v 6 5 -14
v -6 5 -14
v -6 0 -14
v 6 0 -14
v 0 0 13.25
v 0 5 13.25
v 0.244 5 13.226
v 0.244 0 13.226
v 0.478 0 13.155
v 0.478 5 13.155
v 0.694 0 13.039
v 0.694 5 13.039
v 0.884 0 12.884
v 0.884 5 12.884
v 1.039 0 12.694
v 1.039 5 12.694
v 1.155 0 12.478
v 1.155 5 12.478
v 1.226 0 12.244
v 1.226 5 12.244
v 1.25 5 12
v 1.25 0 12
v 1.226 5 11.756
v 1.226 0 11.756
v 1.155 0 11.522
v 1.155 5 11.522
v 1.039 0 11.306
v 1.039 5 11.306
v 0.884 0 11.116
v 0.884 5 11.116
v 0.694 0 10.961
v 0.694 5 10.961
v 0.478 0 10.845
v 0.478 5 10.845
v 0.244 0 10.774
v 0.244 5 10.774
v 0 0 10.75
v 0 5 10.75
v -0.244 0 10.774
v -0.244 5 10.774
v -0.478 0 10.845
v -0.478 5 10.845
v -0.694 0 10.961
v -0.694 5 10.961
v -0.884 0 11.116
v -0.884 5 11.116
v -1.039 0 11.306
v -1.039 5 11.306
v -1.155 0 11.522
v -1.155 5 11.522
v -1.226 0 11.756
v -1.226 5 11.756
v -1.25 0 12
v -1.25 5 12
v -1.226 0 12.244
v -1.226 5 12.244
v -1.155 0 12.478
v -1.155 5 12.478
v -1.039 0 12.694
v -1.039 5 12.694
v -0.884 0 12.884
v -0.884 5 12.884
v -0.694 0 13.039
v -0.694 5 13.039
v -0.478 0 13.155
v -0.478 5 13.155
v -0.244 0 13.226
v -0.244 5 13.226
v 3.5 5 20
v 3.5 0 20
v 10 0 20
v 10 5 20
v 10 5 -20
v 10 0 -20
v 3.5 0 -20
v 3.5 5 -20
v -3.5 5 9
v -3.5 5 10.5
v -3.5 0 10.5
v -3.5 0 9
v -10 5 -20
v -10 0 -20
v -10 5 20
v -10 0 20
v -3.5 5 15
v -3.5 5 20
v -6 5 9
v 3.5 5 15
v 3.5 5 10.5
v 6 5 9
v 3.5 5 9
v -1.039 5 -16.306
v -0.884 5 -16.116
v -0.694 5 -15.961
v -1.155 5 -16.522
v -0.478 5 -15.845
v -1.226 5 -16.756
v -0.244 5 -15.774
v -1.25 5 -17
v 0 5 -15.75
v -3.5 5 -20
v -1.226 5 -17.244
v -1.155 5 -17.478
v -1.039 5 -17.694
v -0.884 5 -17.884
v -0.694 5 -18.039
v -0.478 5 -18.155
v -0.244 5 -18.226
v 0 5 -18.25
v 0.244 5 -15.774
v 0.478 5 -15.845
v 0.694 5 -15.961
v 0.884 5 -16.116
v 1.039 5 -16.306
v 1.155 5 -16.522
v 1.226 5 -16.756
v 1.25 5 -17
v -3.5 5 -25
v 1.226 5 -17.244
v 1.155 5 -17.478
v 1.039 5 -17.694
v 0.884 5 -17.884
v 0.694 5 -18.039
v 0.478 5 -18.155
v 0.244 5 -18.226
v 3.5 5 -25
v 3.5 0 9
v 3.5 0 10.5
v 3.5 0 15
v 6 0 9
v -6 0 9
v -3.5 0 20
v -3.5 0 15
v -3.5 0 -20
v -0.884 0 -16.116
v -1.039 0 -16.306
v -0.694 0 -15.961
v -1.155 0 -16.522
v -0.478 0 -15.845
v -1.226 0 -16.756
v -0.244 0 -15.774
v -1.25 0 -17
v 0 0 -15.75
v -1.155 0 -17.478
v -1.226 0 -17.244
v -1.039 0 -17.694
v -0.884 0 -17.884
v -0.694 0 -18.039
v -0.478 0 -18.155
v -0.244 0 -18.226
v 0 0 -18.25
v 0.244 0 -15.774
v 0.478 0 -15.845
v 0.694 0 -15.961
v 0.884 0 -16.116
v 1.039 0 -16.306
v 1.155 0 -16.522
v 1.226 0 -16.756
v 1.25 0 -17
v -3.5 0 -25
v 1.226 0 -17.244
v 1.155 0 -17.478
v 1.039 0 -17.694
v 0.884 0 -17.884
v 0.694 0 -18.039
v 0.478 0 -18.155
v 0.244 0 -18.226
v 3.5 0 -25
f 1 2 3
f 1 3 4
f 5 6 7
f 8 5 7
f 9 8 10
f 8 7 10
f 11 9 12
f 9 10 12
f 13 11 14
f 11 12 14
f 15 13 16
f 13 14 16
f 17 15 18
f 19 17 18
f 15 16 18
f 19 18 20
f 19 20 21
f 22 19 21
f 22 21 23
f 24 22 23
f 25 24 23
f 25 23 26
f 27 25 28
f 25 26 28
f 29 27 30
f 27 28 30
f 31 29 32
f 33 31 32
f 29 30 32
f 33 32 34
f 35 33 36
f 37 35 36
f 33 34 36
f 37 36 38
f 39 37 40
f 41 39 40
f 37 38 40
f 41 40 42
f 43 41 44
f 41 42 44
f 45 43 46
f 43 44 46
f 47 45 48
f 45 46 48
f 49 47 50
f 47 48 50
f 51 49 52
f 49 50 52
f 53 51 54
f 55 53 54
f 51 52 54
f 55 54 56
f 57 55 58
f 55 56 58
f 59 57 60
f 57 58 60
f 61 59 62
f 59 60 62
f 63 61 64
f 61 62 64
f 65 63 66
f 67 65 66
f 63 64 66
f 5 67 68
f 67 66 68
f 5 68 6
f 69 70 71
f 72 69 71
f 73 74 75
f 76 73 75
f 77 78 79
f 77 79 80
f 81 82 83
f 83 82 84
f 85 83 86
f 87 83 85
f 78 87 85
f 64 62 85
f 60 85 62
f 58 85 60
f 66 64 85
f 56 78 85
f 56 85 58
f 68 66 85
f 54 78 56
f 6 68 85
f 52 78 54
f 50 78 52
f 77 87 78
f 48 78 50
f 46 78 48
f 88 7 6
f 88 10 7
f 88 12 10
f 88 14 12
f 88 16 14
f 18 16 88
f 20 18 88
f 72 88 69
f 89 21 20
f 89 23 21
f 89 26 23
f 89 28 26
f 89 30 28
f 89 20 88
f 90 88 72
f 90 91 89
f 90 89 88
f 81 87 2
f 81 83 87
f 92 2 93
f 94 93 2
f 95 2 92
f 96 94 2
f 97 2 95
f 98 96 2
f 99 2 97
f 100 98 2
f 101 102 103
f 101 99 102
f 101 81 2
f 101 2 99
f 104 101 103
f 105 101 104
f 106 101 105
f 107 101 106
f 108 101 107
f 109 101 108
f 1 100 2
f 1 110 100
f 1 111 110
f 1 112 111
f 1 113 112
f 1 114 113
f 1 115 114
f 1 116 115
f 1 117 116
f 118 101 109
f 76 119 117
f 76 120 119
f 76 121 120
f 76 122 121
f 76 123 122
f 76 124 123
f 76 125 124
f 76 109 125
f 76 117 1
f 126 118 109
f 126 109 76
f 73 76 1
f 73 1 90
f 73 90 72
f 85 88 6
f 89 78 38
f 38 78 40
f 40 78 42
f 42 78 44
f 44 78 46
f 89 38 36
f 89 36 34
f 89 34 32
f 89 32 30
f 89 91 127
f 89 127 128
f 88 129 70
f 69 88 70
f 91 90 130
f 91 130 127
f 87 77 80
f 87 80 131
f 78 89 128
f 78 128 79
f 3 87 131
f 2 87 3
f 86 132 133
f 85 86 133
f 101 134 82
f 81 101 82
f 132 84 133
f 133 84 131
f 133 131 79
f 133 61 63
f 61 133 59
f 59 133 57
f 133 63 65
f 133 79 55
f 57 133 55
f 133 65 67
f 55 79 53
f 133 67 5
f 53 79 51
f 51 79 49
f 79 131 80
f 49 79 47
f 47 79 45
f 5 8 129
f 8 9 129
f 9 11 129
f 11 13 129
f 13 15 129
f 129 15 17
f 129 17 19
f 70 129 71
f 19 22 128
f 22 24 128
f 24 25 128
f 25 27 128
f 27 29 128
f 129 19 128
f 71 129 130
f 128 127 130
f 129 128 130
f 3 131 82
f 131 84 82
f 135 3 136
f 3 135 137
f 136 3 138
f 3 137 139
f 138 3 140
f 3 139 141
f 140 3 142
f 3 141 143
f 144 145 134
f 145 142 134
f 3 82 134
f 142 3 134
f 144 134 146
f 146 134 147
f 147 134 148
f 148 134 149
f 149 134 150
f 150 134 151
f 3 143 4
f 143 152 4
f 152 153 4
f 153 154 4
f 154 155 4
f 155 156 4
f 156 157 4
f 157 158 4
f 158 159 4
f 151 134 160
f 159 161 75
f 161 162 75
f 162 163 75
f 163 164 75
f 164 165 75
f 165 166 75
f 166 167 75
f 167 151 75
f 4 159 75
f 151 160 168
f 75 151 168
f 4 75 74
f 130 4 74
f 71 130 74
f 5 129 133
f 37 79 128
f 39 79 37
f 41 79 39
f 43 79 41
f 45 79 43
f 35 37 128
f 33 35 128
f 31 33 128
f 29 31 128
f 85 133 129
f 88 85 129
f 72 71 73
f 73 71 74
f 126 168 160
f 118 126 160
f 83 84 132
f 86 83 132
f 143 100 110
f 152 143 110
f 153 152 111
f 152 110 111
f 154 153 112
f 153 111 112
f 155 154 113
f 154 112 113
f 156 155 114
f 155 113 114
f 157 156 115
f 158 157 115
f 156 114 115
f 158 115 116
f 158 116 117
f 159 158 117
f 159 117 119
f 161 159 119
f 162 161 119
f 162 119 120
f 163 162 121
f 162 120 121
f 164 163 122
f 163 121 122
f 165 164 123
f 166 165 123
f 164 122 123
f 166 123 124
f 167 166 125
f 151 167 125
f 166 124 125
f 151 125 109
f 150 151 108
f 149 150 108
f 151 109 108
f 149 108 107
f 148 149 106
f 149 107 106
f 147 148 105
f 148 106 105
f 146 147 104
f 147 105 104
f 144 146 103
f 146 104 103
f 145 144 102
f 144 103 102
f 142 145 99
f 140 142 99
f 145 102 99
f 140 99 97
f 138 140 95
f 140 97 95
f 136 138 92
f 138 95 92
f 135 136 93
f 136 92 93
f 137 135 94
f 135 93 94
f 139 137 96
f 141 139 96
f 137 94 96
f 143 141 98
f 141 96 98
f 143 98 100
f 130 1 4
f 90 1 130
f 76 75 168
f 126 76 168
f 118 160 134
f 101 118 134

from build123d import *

# Parameters (mm, degrees)
BOSS_EXTRUDE1_DEPTH = 5
SKETCH2_R           = 1.25
CUT_EXTRUDE1_DEPTH  = 5


with BuildPart() as part:
    # Sketch1 → Boss-Extrude1 (new body)
    with BuildSketch(Plane(origin=(0, 0, 0), x_dir=(1, 0, 0), z_dir=(0, 1, 0))):
        Polygon((-10, 20), (-10, -20), (-3.5, -20), (-3.5, -15), (3.5, -15), (3.5, -20), (10, -20), (10, 20), (3.5, 20), (3.5, 25), (-3.5, 25), (-3.5, 20), align=None)
    extrude(amount=BOSS_EXTRUDE1_DEPTH)

    # Sketch2 → Cut-Extrude1 (cut)
    with BuildSketch(Plane(origin=(0, 5, 0), x_dir=(1, 0, 0), z_dir=(0, 1, 0))):
        with Locations(Location((0, 17, 0), (0, 0, 270))):
            Circle(SKETCH2_R)
        with Locations(Location((0, -12, 0), (0, 0, 270))):
            Circle(SKETCH2_R)
        Polygon((-6, 14), (6, 14), (6, -9), (3.5, -9), (3.5, -10.5), (-3.5, -10.5), (-3.5, -9), (-6, -9), align=None)
    extrude(amount=-CUT_EXTRUDE1_DEPTH, mode=Mode.SUBTRACT)


solid = part.part
